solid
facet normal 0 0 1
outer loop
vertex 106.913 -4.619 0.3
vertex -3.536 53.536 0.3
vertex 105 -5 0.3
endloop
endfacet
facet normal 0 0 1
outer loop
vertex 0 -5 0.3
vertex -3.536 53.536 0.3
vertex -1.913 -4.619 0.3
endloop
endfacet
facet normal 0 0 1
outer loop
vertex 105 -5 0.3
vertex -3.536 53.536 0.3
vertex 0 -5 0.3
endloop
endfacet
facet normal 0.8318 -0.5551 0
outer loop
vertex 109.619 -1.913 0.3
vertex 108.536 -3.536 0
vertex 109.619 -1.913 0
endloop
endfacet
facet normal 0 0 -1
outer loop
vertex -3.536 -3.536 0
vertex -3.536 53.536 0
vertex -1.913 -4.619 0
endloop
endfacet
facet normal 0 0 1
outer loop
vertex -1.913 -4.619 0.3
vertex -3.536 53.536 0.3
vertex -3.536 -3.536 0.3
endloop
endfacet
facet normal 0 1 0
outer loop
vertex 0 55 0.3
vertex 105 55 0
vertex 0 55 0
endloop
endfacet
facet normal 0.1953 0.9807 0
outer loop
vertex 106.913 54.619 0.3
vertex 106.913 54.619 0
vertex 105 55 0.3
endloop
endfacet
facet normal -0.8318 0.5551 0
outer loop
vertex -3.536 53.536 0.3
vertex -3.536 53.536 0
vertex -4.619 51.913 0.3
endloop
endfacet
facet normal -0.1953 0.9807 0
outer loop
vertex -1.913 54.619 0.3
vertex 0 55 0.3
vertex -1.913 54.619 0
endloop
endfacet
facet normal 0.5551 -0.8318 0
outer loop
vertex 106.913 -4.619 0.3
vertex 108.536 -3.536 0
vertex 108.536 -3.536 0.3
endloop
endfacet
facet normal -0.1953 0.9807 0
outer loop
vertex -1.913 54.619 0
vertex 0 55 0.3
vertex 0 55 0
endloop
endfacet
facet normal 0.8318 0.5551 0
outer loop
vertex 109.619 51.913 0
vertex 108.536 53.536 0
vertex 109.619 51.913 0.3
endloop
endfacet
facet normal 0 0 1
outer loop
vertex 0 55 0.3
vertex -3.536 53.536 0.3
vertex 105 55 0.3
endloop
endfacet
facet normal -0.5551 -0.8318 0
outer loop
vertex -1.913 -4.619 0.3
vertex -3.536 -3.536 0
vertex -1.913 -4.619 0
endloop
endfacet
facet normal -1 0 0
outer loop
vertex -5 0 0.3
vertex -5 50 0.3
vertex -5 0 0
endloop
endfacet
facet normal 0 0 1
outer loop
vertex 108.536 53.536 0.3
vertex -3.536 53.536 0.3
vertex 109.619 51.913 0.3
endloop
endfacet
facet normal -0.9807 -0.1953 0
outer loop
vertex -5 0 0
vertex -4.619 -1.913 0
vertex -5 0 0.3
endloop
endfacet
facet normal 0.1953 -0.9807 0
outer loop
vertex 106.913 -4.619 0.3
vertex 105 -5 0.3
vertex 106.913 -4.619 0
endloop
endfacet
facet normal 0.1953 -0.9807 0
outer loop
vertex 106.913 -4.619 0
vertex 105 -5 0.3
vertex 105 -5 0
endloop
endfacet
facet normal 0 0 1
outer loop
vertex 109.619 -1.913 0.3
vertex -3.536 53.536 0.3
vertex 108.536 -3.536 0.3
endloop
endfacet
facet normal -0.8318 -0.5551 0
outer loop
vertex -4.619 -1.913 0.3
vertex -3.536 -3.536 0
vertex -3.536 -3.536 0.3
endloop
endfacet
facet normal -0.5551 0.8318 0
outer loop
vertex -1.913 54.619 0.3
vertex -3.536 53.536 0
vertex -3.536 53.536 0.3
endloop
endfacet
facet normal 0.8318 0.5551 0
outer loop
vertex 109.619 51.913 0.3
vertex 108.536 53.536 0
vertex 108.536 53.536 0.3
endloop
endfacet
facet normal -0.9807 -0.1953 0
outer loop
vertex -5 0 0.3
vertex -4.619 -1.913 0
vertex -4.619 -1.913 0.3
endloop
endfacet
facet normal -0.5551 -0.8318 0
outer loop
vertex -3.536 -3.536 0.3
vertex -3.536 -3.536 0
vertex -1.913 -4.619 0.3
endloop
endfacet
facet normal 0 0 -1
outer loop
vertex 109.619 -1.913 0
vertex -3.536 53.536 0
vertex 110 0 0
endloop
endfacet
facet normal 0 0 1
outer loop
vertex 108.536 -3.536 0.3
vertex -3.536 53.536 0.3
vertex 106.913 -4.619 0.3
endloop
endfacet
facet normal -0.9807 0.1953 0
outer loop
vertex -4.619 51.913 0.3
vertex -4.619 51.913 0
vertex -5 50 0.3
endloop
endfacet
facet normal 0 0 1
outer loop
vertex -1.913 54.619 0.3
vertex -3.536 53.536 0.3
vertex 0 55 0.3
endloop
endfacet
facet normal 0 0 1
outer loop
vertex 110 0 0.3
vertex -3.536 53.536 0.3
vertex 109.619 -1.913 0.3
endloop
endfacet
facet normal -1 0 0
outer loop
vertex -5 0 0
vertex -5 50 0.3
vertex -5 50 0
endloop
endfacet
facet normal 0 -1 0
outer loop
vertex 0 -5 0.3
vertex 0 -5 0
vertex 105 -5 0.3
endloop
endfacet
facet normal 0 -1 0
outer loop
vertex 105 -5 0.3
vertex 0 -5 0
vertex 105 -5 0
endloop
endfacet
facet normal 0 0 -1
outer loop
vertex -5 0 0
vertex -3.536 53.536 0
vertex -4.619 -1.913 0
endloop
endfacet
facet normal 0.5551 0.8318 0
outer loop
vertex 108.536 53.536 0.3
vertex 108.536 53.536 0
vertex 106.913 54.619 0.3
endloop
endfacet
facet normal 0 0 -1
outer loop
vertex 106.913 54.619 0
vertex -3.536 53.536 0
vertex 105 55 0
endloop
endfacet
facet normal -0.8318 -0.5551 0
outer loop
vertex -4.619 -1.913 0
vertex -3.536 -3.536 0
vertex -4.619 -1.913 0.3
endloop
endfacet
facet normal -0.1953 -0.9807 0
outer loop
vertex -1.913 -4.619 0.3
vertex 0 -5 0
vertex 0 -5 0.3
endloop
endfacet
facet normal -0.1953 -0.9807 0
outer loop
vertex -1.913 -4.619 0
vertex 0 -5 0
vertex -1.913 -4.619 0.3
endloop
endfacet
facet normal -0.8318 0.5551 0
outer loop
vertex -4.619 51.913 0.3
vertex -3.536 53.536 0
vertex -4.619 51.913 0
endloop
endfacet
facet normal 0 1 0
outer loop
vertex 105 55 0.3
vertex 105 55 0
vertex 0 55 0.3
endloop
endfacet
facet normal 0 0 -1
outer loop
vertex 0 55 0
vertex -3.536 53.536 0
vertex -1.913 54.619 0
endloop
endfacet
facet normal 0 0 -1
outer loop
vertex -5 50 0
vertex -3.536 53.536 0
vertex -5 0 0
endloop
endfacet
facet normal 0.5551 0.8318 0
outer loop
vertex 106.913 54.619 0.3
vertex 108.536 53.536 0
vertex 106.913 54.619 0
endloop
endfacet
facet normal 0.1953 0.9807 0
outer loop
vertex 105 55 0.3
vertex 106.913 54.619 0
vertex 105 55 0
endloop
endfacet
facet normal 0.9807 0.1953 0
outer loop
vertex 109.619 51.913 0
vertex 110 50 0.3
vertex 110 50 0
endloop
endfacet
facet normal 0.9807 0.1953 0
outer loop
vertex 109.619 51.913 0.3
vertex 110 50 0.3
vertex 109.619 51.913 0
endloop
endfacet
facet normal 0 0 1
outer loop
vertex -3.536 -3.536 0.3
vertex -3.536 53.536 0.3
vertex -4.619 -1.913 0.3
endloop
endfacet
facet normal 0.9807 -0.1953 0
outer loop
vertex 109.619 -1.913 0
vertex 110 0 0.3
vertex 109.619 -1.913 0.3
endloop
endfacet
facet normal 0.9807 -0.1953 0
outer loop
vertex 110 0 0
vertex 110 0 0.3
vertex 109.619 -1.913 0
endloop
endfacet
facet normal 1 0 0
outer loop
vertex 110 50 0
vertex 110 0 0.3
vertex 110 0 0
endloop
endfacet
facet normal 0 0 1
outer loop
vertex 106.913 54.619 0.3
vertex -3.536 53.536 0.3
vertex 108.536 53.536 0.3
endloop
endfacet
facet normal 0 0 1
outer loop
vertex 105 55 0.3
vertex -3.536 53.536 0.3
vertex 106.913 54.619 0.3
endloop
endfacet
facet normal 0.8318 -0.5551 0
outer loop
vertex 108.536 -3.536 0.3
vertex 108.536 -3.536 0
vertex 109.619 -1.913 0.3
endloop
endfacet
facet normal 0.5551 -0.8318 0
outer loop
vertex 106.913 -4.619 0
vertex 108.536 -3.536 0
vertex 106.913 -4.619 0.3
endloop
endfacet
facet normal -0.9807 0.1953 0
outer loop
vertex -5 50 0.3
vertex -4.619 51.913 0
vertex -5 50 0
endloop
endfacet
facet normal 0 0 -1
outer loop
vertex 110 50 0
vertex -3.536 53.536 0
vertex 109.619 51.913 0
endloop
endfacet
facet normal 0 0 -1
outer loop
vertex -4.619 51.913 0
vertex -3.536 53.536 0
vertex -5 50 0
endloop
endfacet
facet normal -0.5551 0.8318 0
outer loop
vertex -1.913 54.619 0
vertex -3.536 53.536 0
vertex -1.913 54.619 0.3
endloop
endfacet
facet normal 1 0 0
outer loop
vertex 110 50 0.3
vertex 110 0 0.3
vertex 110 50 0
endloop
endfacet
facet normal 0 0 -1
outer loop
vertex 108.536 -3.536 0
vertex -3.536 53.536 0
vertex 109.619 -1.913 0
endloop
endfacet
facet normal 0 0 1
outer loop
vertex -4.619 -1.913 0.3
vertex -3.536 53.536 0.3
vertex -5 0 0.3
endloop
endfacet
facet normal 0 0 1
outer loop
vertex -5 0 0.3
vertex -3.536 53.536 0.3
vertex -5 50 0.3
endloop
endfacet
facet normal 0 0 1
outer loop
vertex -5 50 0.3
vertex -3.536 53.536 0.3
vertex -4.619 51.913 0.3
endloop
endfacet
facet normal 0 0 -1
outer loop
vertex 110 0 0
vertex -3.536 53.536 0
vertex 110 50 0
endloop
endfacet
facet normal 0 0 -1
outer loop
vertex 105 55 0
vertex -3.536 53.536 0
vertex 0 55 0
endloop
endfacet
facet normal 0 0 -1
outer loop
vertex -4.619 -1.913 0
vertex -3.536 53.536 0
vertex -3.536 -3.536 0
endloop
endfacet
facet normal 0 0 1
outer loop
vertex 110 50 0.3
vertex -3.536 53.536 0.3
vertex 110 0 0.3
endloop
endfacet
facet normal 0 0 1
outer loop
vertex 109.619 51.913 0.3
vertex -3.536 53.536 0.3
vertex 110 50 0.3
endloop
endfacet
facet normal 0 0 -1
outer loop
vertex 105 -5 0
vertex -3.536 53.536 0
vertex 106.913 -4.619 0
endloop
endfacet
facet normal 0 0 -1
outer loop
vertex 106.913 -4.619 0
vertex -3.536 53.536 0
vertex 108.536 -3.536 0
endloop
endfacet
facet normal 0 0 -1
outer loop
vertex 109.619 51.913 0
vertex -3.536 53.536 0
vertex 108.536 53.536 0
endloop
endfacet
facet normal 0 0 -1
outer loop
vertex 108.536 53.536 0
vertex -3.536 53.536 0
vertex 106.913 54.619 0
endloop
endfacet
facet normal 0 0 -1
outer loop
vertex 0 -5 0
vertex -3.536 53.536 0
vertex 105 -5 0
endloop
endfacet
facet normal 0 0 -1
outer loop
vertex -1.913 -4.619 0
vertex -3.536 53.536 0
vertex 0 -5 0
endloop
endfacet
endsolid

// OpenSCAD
hull() {
   cylinder(r=5,h=0.3);
   translate([105,50,0]) cylinder(r=5,h=0.3);
   translate([0,50,0]) cylinder(r=5,h=0.3);
   translate([105,0,0]) cylinder(r=5,h=0.3);
}
